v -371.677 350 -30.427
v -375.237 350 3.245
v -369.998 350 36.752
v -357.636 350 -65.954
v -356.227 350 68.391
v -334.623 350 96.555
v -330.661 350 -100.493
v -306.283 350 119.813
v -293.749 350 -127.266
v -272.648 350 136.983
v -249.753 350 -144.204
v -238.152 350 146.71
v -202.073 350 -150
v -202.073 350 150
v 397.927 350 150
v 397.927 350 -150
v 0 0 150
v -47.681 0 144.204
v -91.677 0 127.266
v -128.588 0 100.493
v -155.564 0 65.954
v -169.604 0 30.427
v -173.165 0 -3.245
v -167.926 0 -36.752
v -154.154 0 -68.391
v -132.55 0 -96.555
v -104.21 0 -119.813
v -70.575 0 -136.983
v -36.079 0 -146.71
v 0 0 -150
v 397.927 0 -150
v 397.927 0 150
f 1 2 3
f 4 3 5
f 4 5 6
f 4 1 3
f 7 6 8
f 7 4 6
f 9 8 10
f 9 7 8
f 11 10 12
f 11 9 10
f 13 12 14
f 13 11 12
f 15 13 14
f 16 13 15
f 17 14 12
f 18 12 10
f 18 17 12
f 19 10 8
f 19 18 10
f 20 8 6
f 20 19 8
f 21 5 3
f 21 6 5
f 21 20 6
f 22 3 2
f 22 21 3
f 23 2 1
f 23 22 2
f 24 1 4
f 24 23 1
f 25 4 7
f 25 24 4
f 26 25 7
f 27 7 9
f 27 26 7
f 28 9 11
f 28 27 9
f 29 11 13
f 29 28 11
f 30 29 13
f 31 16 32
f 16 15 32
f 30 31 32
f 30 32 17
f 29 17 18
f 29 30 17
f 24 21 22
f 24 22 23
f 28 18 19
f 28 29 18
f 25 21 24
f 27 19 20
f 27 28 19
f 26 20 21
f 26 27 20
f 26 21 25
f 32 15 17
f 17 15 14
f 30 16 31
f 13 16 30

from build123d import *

# Parameters (mm, degrees)
AUFSATZ_LINEAR_AUSTRAGEN1_DEPTH             = 150
AUFSATZ_LINEAR_AUSTRAGEN2_REACH             = 712.634
AUFSATZ_LINEAR_AUSTRAGEN2_DIRECTION_2_REACH = 712.634


with BuildPart() as part:
    # Skizze1 → Aufsatz-Linear austragen1 (new, symmetric)
    with BuildSketch(Plane.XY):
        Polygon((0, 0), (-202.072594216, 350), (397.927405784, 350), (397.927405784, 0), align=None)
    extrude(amount=AUFSATZ_LINEAR_AUSTRAGEN1_DEPTH, both=True)

    # Aufsatz-Linear austragen2: up to this face of the body (flat: up to its plane)
    aufsatz_linear_austragen2_end = Plane(part.part.faces().sort_by_distance((198.963702892, 0, 0))[0])
    # Skizze3 → Aufsatz-Linear austragen2 (add, up to the picked face)
    with BuildSketch(Plane(origin=(-202.072594216, 350, 0), x_dir=(0, 0, -1), z_dir=(-0.4999999999999981, 0.8660254037844398, 0)), mode=Mode.PRIVATE) as aufsatz_linear_austragen2_sk1:
        with BuildLine():
            Line((150, 0), (-150, 0))
            ThreePointArc((-150, 0), (0, 150), (150, 0))
        make_face()
    aufsatz_linear_austragen2_tool1 = split(extrude(aufsatz_linear_austragen2_sk1.sketch, amount=-AUFSATZ_LINEAR_AUSTRAGEN2_REACH, mode=Mode.PRIVATE), bisect_by=aufsatz_linear_austragen2_end, keep=Keep.BOTH, mode=Mode.PRIVATE)
    add(aufsatz_linear_austragen2_tool1.solids().sort_by(Axis((-257.205484, 318.169011, 0), (0.4999999999999981, -0.8660254037844398, 0)))[0])

    # Aufsatz-Linear austragen2 direction 2: up to this face of the body (flat: up to its plane)
    aufsatz_linear_austragen2_direction_2_end = Plane(part.part.faces().sort_by_distance((97.927405784, 350, 0))[0])
    # Skizze3 → Aufsatz-Linear austragen2 direction 2 (add, up to the picked face)
    with BuildSketch(Plane(origin=(-202.072594216, 350, 0), x_dir=(0, 0, -1), z_dir=(-0.4999999999999981, 0.8660254037844398, 0)), mode=Mode.PRIVATE) as aufsatz_linear_austragen2_direction_2_sk1:
        with BuildLine():
            Line((150, 0), (-150, 0))
            ThreePointArc((-150, 0), (0, 150), (150, 0))
        make_face()
    aufsatz_linear_austragen2_direction_2_tool1 = split(extrude(aufsatz_linear_austragen2_direction_2_sk1.sketch, amount=AUFSATZ_LINEAR_AUSTRAGEN2_DIRECTION_2_REACH, mode=Mode.PRIVATE), bisect_by=aufsatz_linear_austragen2_direction_2_end, keep=Keep.BOTH, mode=Mode.PRIVATE)
    add(aufsatz_linear_austragen2_direction_2_tool1.solids().sort_by(Axis((-257.205484, 318.169011, 0), (-0.4999999999999981, 0.8660254037844398, 0)))[0])


solid = part.part
